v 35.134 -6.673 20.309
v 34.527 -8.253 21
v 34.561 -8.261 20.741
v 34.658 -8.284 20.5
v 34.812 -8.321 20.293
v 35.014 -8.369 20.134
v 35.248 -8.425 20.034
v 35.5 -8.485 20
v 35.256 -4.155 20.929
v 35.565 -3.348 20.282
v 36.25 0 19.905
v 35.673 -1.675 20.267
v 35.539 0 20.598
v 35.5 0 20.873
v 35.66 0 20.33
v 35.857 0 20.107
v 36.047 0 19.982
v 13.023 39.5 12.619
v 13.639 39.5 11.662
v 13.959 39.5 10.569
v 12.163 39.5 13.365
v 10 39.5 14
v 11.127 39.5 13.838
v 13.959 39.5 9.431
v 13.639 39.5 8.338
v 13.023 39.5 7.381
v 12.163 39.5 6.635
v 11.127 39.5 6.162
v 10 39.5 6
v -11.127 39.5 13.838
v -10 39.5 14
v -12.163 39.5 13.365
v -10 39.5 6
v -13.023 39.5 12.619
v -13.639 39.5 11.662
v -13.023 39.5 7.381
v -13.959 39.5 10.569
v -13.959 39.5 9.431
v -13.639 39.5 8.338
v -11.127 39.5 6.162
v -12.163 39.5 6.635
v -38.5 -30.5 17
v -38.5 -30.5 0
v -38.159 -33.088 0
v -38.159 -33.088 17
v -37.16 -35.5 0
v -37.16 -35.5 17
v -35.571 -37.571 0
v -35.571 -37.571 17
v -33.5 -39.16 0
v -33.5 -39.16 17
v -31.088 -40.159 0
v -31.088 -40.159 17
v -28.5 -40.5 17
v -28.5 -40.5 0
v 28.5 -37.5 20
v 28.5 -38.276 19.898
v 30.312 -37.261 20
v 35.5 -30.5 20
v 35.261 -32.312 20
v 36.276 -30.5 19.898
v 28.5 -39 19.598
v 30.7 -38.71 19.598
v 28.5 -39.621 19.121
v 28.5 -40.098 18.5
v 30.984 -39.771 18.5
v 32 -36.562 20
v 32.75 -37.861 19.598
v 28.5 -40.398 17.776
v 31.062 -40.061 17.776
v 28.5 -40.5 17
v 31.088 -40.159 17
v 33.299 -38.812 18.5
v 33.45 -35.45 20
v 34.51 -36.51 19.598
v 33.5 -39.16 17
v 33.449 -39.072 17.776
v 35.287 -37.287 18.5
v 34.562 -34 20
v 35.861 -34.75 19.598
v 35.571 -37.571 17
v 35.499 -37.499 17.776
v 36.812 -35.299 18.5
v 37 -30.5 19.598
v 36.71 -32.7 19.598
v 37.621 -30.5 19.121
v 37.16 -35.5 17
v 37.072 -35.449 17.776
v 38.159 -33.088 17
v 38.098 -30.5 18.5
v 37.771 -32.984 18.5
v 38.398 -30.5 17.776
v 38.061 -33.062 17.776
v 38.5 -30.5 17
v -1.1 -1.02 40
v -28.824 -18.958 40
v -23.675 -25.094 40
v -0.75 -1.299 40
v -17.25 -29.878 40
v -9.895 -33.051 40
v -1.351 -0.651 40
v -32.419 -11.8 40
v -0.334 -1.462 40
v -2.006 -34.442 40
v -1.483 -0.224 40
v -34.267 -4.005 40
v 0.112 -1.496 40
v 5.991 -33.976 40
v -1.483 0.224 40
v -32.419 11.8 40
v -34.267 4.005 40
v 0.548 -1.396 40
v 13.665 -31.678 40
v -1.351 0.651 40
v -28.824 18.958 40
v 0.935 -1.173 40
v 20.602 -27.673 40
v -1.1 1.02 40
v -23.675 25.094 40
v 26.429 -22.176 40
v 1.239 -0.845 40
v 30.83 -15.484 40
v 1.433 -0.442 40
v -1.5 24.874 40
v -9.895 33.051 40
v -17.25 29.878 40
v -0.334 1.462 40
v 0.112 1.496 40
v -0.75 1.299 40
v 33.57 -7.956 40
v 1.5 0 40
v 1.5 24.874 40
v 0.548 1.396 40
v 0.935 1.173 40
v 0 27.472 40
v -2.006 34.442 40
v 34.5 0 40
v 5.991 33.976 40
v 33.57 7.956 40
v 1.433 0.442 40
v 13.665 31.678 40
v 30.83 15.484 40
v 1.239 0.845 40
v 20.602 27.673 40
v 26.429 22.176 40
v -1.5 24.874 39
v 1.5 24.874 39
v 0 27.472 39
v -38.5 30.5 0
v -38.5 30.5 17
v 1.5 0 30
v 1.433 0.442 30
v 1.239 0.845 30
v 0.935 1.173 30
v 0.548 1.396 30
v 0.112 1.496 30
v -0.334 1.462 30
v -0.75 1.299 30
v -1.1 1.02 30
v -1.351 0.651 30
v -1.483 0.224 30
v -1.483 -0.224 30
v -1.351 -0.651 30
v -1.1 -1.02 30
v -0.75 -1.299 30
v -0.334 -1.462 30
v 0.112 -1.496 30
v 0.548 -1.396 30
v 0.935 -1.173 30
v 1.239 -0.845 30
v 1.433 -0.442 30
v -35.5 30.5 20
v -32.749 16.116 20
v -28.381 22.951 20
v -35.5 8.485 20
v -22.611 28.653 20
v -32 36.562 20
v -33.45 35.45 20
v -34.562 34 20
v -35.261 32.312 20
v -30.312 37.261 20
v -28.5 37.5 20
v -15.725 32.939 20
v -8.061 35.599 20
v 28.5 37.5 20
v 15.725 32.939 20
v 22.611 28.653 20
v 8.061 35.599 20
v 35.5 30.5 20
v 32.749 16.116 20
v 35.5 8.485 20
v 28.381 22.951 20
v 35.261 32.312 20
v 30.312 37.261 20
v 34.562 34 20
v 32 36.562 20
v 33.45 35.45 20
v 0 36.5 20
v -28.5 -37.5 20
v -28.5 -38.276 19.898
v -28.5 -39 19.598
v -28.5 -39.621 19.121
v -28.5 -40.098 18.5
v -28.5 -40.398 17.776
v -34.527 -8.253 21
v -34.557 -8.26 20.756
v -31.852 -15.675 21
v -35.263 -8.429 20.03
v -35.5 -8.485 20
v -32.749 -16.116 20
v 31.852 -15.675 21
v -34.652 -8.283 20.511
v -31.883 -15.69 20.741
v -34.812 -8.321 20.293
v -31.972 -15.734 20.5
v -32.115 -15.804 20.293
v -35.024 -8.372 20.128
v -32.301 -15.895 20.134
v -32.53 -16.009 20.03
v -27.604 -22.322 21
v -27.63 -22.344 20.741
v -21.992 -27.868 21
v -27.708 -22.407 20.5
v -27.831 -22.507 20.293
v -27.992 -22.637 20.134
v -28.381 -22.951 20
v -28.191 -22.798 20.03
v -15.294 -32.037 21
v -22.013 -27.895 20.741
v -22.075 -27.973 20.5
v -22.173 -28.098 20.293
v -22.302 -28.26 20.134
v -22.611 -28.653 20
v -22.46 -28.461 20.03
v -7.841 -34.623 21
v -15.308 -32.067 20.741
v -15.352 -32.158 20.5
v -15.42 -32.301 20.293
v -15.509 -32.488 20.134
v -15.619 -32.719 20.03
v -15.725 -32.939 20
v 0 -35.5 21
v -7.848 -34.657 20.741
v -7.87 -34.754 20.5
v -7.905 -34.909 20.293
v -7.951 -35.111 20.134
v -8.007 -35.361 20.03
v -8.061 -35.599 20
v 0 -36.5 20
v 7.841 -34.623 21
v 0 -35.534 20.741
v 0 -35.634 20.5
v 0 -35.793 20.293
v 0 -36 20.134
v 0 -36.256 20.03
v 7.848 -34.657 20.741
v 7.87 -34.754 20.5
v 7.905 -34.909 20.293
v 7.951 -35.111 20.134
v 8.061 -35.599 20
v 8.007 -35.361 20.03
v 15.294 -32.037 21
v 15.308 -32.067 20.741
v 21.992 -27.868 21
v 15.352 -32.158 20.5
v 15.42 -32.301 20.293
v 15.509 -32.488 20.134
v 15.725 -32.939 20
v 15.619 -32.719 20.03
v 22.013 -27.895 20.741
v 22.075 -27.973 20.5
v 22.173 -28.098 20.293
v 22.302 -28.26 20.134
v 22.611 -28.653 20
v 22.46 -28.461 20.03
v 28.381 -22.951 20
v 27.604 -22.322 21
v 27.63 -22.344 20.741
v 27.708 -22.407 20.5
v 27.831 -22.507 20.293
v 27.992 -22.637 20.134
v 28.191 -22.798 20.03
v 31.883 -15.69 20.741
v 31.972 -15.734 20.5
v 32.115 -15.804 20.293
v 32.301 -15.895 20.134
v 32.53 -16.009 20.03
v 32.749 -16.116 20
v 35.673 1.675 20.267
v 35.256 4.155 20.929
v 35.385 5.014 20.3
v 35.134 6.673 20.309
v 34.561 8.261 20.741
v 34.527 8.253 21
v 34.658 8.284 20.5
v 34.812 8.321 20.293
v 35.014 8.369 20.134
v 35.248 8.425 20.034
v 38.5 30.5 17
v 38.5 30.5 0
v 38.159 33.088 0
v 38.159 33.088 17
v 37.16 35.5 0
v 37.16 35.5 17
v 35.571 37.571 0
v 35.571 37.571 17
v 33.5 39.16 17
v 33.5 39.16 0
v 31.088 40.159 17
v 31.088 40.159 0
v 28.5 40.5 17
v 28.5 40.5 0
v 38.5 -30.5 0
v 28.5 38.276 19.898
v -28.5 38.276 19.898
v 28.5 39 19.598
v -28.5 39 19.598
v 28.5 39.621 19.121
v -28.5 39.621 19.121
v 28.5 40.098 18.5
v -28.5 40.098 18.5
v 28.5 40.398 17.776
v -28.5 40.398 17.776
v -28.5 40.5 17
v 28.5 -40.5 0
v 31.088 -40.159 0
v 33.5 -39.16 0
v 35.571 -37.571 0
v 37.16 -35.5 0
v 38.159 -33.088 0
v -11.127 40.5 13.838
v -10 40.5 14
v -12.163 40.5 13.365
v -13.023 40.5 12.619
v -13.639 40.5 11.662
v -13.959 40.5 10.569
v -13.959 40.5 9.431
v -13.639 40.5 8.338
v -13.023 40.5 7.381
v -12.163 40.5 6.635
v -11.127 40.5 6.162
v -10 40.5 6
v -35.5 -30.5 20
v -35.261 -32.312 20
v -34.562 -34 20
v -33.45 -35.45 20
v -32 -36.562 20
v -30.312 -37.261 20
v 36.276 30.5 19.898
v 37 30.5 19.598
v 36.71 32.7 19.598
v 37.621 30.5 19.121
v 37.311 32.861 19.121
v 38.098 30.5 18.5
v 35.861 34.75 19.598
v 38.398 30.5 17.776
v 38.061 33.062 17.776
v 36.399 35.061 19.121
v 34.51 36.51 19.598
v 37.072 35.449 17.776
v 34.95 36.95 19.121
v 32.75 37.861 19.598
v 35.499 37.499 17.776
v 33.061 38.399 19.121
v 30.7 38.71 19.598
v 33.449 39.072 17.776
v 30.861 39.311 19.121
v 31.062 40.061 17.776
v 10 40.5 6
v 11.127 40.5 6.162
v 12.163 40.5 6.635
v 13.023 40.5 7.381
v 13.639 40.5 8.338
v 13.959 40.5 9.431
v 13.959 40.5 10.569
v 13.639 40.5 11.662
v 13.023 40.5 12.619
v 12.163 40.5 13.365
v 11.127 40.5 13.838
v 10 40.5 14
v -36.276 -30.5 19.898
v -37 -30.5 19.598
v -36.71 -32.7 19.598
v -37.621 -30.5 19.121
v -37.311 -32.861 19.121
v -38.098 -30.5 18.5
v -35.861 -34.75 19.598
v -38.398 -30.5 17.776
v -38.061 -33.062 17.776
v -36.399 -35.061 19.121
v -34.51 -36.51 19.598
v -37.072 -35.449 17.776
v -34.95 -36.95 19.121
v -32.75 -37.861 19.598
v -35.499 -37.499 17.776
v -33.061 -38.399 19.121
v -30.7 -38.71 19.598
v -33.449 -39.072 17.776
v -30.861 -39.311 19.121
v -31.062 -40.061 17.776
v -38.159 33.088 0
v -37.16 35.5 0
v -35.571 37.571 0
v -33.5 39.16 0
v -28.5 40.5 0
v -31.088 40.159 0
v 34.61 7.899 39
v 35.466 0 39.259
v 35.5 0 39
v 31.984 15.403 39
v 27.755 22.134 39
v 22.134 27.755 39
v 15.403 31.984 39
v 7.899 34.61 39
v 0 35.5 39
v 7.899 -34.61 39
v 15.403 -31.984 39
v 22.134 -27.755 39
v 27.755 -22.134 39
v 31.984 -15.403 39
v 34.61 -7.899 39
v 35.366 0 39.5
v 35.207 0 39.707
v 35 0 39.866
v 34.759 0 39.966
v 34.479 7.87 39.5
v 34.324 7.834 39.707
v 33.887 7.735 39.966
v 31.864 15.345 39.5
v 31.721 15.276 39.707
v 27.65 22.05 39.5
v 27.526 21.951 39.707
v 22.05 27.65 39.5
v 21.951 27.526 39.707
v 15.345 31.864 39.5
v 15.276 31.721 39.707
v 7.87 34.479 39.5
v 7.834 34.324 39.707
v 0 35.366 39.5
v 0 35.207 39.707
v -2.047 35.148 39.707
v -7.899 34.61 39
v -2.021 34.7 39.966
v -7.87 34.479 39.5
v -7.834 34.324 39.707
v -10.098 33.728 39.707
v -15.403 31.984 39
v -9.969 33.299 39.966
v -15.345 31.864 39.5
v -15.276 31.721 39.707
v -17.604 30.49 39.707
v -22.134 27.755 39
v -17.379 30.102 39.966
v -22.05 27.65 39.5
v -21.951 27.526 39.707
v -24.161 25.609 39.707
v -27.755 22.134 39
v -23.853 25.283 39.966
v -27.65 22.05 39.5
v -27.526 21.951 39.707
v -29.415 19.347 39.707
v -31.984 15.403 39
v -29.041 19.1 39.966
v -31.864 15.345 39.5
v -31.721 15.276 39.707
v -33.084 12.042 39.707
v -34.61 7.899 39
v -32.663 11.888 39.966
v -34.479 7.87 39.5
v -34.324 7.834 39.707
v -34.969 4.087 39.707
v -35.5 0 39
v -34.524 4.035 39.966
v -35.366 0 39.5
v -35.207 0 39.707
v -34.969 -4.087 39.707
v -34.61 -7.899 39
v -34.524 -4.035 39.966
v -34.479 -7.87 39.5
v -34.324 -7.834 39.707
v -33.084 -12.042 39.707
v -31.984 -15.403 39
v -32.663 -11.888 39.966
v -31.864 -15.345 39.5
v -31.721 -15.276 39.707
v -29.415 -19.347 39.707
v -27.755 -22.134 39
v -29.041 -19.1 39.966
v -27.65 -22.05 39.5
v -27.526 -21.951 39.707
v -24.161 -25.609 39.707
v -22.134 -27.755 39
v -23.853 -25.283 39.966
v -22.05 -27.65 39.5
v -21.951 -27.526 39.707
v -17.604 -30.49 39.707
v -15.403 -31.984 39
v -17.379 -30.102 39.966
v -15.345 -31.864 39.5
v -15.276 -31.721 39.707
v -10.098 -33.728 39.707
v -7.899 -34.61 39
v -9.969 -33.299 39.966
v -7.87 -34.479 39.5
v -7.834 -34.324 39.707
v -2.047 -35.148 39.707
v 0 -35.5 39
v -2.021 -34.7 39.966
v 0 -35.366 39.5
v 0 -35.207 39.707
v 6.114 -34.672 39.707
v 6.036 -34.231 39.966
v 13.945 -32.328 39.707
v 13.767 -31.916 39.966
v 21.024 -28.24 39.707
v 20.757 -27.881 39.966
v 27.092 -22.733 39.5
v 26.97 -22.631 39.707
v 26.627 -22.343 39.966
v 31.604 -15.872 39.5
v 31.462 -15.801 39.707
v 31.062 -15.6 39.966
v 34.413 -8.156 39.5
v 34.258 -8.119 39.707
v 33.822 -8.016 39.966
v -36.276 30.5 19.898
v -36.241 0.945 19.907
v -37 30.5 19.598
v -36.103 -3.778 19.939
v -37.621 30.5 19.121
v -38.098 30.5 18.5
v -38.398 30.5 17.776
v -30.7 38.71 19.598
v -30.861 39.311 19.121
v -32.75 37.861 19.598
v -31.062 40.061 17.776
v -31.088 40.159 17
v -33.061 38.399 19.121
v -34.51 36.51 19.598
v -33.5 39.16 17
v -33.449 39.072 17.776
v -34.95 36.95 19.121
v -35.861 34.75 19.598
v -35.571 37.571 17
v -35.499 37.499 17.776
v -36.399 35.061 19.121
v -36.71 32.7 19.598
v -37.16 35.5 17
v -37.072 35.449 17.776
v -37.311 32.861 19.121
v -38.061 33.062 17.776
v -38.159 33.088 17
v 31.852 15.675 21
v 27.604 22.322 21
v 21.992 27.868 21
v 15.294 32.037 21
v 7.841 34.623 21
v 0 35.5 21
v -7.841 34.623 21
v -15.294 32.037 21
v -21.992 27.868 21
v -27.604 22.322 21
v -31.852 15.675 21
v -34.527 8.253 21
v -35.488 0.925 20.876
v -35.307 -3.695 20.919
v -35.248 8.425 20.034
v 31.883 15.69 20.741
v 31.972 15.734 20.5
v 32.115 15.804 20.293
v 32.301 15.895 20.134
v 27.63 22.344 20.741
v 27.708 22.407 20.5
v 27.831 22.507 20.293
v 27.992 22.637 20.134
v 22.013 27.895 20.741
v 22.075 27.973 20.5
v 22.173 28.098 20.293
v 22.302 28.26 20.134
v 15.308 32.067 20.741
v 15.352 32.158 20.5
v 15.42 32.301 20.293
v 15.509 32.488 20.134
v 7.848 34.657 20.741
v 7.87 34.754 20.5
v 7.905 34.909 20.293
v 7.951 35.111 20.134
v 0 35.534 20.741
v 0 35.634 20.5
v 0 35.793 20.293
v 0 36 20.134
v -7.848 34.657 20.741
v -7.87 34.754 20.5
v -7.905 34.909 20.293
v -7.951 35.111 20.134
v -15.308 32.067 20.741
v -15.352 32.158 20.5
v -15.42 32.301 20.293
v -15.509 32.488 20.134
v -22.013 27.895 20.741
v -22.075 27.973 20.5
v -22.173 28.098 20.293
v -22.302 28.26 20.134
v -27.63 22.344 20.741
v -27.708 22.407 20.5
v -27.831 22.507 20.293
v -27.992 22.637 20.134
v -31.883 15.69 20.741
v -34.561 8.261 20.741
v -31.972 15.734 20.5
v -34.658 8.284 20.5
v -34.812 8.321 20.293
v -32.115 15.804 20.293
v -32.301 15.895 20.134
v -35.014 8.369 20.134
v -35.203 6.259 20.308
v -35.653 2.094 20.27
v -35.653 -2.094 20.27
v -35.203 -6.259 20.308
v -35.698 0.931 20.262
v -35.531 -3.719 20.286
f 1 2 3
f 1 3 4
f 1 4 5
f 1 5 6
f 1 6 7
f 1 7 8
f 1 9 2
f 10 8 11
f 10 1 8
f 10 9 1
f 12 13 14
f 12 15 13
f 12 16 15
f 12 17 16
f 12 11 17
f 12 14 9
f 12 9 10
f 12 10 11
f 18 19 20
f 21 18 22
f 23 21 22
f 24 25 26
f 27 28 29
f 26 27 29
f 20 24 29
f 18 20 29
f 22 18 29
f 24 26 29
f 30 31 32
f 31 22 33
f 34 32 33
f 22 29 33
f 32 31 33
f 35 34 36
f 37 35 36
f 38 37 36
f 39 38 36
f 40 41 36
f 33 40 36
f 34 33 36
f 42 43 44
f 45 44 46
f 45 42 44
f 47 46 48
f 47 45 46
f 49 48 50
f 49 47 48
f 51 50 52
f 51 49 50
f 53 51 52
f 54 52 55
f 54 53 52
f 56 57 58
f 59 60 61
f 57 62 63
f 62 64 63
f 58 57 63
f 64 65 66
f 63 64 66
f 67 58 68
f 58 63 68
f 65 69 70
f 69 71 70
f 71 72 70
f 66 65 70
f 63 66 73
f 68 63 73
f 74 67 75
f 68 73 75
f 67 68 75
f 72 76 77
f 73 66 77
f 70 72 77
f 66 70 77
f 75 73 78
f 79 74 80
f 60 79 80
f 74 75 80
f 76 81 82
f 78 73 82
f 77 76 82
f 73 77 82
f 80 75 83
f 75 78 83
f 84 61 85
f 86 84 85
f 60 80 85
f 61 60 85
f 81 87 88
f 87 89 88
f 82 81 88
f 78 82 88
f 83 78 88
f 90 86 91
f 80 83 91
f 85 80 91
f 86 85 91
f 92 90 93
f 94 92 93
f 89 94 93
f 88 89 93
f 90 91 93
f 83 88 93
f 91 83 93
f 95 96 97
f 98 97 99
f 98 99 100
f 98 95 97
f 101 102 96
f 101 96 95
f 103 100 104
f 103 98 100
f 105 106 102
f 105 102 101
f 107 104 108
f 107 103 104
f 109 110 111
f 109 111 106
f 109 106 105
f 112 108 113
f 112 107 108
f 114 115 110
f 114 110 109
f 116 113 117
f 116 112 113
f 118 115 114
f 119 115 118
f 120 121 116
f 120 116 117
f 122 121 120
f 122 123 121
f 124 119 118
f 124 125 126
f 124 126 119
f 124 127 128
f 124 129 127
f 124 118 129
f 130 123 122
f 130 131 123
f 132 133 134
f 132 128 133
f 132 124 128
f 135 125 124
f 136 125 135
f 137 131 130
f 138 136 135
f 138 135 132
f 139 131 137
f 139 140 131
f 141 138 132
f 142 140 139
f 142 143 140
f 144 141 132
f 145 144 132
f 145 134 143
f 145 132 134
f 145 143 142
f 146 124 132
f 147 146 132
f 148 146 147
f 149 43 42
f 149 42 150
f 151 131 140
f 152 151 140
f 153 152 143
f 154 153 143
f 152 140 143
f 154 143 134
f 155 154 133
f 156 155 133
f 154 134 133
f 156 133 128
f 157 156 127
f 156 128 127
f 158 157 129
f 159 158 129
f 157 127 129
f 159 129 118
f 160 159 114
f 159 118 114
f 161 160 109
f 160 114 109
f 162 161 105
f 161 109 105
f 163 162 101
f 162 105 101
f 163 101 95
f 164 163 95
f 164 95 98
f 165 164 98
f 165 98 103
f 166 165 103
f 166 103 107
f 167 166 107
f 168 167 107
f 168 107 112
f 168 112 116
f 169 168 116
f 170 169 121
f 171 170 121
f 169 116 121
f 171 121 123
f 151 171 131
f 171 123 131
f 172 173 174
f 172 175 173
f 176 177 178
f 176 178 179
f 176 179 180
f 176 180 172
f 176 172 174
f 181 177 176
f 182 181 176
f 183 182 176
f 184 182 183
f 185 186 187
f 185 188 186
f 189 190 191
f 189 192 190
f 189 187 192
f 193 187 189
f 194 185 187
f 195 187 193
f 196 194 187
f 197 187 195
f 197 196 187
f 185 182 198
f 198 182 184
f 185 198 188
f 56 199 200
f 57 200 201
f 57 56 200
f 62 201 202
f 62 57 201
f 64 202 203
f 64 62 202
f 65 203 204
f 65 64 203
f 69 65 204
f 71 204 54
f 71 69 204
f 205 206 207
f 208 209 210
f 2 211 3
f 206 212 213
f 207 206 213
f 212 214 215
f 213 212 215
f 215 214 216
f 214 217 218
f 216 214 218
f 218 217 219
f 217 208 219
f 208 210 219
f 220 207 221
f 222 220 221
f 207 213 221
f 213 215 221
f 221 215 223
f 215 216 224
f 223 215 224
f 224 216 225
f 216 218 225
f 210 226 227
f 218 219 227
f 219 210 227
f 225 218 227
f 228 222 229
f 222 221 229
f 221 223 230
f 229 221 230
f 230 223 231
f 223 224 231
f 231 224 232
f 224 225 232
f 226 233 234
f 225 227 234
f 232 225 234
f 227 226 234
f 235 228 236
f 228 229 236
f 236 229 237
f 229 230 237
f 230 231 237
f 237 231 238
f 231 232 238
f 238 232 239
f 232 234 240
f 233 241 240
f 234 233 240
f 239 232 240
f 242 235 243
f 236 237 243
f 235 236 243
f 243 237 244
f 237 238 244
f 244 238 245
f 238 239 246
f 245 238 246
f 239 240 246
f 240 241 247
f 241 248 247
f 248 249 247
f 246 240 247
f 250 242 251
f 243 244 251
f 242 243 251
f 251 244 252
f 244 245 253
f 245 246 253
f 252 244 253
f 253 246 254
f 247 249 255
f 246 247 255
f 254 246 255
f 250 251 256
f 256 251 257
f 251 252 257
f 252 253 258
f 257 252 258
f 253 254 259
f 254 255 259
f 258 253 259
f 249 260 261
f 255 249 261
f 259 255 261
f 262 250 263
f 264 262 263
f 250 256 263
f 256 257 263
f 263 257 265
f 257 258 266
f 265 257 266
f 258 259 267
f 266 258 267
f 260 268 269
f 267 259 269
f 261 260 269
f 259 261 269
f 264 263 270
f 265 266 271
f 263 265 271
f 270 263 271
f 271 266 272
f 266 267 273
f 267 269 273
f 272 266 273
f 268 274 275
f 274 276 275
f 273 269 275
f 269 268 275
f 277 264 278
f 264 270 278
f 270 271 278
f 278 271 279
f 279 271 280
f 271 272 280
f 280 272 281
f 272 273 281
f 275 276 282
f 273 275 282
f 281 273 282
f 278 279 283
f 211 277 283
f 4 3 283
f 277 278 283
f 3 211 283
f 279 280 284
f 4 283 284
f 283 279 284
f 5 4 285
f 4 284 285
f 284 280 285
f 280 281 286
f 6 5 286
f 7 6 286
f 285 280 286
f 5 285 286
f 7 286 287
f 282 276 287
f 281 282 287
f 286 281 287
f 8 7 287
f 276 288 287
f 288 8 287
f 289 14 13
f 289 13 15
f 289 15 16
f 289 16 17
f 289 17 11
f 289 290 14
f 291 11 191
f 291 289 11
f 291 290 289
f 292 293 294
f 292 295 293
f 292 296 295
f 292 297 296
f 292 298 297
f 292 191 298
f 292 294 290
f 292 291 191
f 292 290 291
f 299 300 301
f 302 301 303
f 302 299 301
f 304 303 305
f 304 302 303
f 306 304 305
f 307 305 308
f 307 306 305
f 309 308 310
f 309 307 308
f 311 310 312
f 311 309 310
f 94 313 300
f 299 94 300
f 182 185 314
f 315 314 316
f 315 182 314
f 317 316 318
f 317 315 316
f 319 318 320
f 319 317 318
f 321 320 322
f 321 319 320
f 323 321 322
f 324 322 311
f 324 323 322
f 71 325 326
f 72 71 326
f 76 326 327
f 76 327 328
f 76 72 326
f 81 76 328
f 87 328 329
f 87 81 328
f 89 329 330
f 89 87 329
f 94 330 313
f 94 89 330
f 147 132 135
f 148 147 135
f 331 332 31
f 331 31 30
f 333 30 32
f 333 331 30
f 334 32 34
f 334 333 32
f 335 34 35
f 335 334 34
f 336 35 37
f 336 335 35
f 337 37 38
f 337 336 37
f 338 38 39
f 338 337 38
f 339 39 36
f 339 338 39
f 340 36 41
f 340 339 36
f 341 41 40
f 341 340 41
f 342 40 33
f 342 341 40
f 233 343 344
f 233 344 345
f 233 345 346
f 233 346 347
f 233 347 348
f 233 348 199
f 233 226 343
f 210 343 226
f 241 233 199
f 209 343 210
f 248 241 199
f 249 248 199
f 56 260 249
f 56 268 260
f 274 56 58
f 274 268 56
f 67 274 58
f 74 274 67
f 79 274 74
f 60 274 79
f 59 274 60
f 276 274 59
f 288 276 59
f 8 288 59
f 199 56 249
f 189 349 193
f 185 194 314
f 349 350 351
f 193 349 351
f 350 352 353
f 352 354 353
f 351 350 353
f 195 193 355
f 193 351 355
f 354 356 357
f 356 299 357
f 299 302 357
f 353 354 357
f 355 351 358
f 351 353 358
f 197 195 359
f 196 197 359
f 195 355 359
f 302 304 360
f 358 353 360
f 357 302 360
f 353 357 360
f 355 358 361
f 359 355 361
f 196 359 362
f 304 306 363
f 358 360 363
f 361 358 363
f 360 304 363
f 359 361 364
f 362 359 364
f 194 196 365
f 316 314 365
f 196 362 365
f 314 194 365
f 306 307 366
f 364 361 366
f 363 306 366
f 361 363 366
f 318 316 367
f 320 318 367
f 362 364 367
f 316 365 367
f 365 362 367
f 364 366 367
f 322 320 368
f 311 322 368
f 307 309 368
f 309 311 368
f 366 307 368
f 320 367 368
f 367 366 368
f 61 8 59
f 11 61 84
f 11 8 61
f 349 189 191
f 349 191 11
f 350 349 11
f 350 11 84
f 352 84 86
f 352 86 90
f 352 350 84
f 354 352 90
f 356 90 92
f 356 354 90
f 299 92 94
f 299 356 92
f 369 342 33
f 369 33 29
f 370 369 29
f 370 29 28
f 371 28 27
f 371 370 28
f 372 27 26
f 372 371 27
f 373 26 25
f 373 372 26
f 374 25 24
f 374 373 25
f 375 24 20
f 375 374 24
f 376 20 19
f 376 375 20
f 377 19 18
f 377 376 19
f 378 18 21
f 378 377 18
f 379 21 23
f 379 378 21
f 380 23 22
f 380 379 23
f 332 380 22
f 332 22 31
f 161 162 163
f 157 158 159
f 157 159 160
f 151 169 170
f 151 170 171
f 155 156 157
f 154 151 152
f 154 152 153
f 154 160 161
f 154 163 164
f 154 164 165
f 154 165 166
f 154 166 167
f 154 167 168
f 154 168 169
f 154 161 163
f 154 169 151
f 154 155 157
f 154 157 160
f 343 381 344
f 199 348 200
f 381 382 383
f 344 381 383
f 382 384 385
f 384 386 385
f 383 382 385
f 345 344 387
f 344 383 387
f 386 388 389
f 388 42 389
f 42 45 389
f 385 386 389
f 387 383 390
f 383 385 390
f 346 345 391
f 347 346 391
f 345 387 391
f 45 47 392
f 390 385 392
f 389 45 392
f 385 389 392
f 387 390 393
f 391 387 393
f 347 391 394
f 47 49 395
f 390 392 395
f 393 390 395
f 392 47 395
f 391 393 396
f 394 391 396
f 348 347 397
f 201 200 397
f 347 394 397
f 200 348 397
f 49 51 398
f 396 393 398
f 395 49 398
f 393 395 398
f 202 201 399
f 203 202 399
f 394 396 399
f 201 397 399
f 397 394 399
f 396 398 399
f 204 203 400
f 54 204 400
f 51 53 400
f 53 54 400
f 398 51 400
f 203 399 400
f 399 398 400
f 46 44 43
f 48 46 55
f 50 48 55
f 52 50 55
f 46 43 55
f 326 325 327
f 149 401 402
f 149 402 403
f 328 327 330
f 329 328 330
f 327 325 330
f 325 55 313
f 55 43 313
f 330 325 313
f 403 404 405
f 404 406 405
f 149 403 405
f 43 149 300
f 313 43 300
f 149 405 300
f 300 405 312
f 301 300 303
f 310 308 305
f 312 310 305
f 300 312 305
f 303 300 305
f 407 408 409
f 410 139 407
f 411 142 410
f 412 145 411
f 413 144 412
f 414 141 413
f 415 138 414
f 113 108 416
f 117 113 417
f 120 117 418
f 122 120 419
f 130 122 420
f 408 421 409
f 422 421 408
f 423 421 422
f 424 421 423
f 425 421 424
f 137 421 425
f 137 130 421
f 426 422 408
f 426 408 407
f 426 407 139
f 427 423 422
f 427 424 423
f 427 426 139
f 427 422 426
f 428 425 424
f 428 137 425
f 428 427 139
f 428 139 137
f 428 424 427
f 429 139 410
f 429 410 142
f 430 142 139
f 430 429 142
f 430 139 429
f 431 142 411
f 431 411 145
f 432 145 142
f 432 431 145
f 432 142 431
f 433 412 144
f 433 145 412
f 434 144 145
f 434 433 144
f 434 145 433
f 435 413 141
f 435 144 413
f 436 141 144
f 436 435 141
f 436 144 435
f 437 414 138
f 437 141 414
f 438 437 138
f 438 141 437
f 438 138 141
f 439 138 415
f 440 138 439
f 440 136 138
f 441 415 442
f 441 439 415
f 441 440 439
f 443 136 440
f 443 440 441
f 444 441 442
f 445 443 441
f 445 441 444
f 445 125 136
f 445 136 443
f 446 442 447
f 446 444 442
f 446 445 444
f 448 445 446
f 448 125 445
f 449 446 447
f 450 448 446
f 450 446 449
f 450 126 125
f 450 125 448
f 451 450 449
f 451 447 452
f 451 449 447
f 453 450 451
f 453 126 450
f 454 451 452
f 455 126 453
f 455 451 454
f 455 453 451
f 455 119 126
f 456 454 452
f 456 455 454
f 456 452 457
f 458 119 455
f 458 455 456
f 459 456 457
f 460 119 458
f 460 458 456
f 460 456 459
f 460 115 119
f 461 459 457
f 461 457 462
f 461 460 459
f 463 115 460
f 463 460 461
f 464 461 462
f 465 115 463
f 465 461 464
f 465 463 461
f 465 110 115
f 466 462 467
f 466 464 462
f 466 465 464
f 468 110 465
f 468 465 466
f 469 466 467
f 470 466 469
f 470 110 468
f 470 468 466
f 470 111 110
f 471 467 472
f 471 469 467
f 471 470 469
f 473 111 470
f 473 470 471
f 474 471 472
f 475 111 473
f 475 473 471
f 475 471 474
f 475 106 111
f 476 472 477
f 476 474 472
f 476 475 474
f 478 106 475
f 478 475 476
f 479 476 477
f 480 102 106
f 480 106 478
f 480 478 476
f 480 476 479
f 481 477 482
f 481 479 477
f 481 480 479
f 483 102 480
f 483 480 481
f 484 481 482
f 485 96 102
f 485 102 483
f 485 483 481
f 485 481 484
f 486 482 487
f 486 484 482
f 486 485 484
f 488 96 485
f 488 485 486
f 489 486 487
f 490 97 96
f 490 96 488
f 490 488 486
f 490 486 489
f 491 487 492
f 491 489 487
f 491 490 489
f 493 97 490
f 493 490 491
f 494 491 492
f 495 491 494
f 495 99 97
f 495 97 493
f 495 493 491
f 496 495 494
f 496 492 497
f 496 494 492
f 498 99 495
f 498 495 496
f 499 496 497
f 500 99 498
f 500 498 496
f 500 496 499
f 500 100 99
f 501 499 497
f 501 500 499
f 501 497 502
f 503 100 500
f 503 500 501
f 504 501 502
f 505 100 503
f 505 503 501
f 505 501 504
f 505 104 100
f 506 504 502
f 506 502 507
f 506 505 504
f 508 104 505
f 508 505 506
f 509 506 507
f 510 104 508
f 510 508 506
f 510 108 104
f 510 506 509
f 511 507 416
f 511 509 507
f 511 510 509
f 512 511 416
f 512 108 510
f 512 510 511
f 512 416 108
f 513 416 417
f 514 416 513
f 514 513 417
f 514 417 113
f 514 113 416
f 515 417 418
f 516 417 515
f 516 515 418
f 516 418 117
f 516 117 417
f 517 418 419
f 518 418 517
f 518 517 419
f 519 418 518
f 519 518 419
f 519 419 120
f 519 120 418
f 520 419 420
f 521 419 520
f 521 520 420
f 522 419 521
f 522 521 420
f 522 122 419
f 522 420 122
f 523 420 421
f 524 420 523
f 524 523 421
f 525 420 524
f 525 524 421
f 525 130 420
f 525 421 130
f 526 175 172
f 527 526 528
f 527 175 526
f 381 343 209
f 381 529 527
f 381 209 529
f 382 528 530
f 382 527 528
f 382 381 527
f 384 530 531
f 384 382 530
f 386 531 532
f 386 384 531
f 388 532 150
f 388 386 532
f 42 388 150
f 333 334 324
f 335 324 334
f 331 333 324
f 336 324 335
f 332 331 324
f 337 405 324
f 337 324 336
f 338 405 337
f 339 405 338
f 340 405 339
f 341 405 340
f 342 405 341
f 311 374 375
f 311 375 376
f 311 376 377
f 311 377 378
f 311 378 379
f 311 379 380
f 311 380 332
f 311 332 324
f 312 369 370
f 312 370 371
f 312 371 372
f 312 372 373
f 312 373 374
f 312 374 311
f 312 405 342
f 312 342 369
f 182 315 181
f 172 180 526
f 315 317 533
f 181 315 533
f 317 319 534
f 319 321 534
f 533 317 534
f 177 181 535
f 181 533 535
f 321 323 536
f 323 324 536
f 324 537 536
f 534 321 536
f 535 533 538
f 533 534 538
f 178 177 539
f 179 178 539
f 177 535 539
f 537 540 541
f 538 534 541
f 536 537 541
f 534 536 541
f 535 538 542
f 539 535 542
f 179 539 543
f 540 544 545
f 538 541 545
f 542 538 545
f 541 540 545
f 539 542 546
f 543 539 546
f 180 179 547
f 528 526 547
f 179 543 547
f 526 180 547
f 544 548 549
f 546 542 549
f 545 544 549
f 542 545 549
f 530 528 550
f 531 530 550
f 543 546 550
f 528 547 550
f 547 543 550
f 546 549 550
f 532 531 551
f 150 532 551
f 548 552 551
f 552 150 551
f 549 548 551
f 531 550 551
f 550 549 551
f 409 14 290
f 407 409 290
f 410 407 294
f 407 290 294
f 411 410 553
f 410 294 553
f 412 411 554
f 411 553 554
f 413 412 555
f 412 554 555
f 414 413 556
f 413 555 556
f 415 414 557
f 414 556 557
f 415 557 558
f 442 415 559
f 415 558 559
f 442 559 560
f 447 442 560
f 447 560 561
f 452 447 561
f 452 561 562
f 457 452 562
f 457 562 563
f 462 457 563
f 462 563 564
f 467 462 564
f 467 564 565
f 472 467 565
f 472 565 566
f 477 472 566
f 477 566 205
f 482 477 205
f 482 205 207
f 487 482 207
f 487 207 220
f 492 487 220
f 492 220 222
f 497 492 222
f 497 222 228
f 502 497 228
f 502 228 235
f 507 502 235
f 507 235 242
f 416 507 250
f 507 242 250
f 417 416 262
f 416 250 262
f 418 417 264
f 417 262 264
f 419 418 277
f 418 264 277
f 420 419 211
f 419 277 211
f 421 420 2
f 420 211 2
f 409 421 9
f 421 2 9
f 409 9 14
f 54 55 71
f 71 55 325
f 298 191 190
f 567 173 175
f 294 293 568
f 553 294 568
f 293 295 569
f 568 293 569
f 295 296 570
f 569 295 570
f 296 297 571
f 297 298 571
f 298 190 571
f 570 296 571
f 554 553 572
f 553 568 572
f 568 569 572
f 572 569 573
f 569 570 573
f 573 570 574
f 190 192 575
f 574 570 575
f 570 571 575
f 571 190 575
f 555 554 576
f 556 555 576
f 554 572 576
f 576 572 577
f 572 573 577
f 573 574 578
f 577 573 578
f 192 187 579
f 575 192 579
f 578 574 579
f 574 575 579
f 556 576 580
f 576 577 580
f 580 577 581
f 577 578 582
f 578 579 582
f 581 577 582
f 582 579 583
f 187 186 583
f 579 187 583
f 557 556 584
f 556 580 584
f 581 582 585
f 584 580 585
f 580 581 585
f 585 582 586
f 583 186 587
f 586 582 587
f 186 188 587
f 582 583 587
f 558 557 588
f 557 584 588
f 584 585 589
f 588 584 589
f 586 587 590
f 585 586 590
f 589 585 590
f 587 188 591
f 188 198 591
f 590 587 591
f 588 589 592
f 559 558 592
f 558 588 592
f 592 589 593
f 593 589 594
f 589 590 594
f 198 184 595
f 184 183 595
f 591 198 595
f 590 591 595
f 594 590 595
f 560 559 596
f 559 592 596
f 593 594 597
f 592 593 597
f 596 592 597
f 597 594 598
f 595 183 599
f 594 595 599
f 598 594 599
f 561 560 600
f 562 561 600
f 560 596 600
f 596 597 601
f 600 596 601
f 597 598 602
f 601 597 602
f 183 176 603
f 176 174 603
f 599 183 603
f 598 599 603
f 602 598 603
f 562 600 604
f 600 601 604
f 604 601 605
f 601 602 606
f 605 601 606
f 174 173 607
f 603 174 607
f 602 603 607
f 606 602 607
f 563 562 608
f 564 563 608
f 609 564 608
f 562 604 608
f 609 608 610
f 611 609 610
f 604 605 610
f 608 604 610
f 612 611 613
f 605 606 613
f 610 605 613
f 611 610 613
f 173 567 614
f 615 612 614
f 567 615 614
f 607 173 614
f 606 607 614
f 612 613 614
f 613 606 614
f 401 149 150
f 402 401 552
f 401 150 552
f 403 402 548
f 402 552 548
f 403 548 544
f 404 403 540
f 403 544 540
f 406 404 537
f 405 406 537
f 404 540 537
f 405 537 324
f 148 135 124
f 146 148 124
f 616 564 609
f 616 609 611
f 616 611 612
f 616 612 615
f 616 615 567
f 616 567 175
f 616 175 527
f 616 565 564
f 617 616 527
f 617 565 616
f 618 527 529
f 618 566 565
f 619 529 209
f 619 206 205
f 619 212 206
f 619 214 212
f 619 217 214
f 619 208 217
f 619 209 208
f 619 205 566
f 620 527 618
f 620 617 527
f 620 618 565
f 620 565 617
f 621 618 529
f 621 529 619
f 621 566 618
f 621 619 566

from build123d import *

# Parameters (mm, degrees)
SKETCH_1_W          = 77
SKETCH_1_H          = 81
EXTRUDE_1_DEPTH     = 20
FILLET_1_R          = 10
FILLET_2_R          = 3
SKETCH_3_R          = 35.5
EXTRUDE_2_DEPTH     = 20
FILLET_3_R          = 1
SKETCH_4_R          = 1.5
CUT_EXTRUDE_1_DEPTH = 10
CUT_EXTRUDE_2_DEPTH = 1
CUT_EXTRUDE_3_DEPTH = 1


with BuildPart() as part:
    # 草图1 → 凸台-拉伸1 (new body)
    with BuildSketch(Plane.XY):
        Rectangle(SKETCH_1_W, SKETCH_1_H)
    extrude(amount=EXTRUDE_1_DEPTH)

    # 圆角1
    fillet_1_edges = [part.edges().sort_by_distance(p)[0] for p in [
        (38.5, -40.5, 10),
        (-38.5, -40.5, 10),
        (-38.5, 40.5, 10),
        (38.5, 40.5, 10),
    ]]
    fillet(fillet_1_edges, radius=FILLET_1_R)

    # 圆角2
    fillet_2_edges = [part.edges().sort_by_distance(p)[0] for p in [
        (38.5, 0, 20),
        (0, -40.5, 20),
        (0, 40.5, 20),
        (-38.5, 0, 20),
        (-35.571067812, 37.571067812, 20),
        (-35.571067812, -37.571067812, 20),
        (35.571067812, 37.571067812, 20),
        (35.571067812, -37.571067812, 20),
    ]]
    fillet(fillet_2_edges, radius=FILLET_2_R)

    # 草图3 → 凸台-拉伸2 (add)
    with BuildSketch(Plane.XY.offset(20)):
        Circle(SKETCH_3_R)
    extrude(amount=EXTRUDE_2_DEPTH)

    # 圆角3
    fillet_3_edges = [part.edges().sort_by_distance(p)[0] for p in [
        (4e-08, 35.5, 20),
        (-4e-08, -35.5, 20),
        (-35.5, 0, 40),
    ]]
    fillet(fillet_3_edges, radius=FILLET_3_R)

    # 草图4 → 切除-拉伸1 (cut)
    with BuildSketch(Plane.XY.offset(40)):
        Circle(SKETCH_4_R)
    extrude(amount=-CUT_EXTRUDE_1_DEPTH, mode=Mode.SUBTRACT)

    # 草图5 → 切除-拉伸2 (cut)
    with BuildSketch(Plane(origin=(0, 40.5, 0), x_dir=(1, 0, 0), z_dir=(0, 1, 0))):
        with BuildLine():
            Line((-10, -6), (10, -6))
            ThreePointArc((10, -6), (14, -10), (10, -14))
            Line((10, -14), (-10, -14))
            ThreePointArc((-10, -14), (-14, -10), (-10, -6))
        make_face()
    extrude(amount=-CUT_EXTRUDE_2_DEPTH, mode=Mode.SUBTRACT)

    # 草图6 → 切除-拉伸3 (cut)
    with BuildSketch(Plane.XY.offset(40)):
        Polygon((0, 27.472496233), (-1.5, 24.874420022), (1.5, 24.874420022), align=None)
    extrude(amount=-CUT_EXTRUDE_3_DEPTH, mode=Mode.SUBTRACT)


solid = part.part
